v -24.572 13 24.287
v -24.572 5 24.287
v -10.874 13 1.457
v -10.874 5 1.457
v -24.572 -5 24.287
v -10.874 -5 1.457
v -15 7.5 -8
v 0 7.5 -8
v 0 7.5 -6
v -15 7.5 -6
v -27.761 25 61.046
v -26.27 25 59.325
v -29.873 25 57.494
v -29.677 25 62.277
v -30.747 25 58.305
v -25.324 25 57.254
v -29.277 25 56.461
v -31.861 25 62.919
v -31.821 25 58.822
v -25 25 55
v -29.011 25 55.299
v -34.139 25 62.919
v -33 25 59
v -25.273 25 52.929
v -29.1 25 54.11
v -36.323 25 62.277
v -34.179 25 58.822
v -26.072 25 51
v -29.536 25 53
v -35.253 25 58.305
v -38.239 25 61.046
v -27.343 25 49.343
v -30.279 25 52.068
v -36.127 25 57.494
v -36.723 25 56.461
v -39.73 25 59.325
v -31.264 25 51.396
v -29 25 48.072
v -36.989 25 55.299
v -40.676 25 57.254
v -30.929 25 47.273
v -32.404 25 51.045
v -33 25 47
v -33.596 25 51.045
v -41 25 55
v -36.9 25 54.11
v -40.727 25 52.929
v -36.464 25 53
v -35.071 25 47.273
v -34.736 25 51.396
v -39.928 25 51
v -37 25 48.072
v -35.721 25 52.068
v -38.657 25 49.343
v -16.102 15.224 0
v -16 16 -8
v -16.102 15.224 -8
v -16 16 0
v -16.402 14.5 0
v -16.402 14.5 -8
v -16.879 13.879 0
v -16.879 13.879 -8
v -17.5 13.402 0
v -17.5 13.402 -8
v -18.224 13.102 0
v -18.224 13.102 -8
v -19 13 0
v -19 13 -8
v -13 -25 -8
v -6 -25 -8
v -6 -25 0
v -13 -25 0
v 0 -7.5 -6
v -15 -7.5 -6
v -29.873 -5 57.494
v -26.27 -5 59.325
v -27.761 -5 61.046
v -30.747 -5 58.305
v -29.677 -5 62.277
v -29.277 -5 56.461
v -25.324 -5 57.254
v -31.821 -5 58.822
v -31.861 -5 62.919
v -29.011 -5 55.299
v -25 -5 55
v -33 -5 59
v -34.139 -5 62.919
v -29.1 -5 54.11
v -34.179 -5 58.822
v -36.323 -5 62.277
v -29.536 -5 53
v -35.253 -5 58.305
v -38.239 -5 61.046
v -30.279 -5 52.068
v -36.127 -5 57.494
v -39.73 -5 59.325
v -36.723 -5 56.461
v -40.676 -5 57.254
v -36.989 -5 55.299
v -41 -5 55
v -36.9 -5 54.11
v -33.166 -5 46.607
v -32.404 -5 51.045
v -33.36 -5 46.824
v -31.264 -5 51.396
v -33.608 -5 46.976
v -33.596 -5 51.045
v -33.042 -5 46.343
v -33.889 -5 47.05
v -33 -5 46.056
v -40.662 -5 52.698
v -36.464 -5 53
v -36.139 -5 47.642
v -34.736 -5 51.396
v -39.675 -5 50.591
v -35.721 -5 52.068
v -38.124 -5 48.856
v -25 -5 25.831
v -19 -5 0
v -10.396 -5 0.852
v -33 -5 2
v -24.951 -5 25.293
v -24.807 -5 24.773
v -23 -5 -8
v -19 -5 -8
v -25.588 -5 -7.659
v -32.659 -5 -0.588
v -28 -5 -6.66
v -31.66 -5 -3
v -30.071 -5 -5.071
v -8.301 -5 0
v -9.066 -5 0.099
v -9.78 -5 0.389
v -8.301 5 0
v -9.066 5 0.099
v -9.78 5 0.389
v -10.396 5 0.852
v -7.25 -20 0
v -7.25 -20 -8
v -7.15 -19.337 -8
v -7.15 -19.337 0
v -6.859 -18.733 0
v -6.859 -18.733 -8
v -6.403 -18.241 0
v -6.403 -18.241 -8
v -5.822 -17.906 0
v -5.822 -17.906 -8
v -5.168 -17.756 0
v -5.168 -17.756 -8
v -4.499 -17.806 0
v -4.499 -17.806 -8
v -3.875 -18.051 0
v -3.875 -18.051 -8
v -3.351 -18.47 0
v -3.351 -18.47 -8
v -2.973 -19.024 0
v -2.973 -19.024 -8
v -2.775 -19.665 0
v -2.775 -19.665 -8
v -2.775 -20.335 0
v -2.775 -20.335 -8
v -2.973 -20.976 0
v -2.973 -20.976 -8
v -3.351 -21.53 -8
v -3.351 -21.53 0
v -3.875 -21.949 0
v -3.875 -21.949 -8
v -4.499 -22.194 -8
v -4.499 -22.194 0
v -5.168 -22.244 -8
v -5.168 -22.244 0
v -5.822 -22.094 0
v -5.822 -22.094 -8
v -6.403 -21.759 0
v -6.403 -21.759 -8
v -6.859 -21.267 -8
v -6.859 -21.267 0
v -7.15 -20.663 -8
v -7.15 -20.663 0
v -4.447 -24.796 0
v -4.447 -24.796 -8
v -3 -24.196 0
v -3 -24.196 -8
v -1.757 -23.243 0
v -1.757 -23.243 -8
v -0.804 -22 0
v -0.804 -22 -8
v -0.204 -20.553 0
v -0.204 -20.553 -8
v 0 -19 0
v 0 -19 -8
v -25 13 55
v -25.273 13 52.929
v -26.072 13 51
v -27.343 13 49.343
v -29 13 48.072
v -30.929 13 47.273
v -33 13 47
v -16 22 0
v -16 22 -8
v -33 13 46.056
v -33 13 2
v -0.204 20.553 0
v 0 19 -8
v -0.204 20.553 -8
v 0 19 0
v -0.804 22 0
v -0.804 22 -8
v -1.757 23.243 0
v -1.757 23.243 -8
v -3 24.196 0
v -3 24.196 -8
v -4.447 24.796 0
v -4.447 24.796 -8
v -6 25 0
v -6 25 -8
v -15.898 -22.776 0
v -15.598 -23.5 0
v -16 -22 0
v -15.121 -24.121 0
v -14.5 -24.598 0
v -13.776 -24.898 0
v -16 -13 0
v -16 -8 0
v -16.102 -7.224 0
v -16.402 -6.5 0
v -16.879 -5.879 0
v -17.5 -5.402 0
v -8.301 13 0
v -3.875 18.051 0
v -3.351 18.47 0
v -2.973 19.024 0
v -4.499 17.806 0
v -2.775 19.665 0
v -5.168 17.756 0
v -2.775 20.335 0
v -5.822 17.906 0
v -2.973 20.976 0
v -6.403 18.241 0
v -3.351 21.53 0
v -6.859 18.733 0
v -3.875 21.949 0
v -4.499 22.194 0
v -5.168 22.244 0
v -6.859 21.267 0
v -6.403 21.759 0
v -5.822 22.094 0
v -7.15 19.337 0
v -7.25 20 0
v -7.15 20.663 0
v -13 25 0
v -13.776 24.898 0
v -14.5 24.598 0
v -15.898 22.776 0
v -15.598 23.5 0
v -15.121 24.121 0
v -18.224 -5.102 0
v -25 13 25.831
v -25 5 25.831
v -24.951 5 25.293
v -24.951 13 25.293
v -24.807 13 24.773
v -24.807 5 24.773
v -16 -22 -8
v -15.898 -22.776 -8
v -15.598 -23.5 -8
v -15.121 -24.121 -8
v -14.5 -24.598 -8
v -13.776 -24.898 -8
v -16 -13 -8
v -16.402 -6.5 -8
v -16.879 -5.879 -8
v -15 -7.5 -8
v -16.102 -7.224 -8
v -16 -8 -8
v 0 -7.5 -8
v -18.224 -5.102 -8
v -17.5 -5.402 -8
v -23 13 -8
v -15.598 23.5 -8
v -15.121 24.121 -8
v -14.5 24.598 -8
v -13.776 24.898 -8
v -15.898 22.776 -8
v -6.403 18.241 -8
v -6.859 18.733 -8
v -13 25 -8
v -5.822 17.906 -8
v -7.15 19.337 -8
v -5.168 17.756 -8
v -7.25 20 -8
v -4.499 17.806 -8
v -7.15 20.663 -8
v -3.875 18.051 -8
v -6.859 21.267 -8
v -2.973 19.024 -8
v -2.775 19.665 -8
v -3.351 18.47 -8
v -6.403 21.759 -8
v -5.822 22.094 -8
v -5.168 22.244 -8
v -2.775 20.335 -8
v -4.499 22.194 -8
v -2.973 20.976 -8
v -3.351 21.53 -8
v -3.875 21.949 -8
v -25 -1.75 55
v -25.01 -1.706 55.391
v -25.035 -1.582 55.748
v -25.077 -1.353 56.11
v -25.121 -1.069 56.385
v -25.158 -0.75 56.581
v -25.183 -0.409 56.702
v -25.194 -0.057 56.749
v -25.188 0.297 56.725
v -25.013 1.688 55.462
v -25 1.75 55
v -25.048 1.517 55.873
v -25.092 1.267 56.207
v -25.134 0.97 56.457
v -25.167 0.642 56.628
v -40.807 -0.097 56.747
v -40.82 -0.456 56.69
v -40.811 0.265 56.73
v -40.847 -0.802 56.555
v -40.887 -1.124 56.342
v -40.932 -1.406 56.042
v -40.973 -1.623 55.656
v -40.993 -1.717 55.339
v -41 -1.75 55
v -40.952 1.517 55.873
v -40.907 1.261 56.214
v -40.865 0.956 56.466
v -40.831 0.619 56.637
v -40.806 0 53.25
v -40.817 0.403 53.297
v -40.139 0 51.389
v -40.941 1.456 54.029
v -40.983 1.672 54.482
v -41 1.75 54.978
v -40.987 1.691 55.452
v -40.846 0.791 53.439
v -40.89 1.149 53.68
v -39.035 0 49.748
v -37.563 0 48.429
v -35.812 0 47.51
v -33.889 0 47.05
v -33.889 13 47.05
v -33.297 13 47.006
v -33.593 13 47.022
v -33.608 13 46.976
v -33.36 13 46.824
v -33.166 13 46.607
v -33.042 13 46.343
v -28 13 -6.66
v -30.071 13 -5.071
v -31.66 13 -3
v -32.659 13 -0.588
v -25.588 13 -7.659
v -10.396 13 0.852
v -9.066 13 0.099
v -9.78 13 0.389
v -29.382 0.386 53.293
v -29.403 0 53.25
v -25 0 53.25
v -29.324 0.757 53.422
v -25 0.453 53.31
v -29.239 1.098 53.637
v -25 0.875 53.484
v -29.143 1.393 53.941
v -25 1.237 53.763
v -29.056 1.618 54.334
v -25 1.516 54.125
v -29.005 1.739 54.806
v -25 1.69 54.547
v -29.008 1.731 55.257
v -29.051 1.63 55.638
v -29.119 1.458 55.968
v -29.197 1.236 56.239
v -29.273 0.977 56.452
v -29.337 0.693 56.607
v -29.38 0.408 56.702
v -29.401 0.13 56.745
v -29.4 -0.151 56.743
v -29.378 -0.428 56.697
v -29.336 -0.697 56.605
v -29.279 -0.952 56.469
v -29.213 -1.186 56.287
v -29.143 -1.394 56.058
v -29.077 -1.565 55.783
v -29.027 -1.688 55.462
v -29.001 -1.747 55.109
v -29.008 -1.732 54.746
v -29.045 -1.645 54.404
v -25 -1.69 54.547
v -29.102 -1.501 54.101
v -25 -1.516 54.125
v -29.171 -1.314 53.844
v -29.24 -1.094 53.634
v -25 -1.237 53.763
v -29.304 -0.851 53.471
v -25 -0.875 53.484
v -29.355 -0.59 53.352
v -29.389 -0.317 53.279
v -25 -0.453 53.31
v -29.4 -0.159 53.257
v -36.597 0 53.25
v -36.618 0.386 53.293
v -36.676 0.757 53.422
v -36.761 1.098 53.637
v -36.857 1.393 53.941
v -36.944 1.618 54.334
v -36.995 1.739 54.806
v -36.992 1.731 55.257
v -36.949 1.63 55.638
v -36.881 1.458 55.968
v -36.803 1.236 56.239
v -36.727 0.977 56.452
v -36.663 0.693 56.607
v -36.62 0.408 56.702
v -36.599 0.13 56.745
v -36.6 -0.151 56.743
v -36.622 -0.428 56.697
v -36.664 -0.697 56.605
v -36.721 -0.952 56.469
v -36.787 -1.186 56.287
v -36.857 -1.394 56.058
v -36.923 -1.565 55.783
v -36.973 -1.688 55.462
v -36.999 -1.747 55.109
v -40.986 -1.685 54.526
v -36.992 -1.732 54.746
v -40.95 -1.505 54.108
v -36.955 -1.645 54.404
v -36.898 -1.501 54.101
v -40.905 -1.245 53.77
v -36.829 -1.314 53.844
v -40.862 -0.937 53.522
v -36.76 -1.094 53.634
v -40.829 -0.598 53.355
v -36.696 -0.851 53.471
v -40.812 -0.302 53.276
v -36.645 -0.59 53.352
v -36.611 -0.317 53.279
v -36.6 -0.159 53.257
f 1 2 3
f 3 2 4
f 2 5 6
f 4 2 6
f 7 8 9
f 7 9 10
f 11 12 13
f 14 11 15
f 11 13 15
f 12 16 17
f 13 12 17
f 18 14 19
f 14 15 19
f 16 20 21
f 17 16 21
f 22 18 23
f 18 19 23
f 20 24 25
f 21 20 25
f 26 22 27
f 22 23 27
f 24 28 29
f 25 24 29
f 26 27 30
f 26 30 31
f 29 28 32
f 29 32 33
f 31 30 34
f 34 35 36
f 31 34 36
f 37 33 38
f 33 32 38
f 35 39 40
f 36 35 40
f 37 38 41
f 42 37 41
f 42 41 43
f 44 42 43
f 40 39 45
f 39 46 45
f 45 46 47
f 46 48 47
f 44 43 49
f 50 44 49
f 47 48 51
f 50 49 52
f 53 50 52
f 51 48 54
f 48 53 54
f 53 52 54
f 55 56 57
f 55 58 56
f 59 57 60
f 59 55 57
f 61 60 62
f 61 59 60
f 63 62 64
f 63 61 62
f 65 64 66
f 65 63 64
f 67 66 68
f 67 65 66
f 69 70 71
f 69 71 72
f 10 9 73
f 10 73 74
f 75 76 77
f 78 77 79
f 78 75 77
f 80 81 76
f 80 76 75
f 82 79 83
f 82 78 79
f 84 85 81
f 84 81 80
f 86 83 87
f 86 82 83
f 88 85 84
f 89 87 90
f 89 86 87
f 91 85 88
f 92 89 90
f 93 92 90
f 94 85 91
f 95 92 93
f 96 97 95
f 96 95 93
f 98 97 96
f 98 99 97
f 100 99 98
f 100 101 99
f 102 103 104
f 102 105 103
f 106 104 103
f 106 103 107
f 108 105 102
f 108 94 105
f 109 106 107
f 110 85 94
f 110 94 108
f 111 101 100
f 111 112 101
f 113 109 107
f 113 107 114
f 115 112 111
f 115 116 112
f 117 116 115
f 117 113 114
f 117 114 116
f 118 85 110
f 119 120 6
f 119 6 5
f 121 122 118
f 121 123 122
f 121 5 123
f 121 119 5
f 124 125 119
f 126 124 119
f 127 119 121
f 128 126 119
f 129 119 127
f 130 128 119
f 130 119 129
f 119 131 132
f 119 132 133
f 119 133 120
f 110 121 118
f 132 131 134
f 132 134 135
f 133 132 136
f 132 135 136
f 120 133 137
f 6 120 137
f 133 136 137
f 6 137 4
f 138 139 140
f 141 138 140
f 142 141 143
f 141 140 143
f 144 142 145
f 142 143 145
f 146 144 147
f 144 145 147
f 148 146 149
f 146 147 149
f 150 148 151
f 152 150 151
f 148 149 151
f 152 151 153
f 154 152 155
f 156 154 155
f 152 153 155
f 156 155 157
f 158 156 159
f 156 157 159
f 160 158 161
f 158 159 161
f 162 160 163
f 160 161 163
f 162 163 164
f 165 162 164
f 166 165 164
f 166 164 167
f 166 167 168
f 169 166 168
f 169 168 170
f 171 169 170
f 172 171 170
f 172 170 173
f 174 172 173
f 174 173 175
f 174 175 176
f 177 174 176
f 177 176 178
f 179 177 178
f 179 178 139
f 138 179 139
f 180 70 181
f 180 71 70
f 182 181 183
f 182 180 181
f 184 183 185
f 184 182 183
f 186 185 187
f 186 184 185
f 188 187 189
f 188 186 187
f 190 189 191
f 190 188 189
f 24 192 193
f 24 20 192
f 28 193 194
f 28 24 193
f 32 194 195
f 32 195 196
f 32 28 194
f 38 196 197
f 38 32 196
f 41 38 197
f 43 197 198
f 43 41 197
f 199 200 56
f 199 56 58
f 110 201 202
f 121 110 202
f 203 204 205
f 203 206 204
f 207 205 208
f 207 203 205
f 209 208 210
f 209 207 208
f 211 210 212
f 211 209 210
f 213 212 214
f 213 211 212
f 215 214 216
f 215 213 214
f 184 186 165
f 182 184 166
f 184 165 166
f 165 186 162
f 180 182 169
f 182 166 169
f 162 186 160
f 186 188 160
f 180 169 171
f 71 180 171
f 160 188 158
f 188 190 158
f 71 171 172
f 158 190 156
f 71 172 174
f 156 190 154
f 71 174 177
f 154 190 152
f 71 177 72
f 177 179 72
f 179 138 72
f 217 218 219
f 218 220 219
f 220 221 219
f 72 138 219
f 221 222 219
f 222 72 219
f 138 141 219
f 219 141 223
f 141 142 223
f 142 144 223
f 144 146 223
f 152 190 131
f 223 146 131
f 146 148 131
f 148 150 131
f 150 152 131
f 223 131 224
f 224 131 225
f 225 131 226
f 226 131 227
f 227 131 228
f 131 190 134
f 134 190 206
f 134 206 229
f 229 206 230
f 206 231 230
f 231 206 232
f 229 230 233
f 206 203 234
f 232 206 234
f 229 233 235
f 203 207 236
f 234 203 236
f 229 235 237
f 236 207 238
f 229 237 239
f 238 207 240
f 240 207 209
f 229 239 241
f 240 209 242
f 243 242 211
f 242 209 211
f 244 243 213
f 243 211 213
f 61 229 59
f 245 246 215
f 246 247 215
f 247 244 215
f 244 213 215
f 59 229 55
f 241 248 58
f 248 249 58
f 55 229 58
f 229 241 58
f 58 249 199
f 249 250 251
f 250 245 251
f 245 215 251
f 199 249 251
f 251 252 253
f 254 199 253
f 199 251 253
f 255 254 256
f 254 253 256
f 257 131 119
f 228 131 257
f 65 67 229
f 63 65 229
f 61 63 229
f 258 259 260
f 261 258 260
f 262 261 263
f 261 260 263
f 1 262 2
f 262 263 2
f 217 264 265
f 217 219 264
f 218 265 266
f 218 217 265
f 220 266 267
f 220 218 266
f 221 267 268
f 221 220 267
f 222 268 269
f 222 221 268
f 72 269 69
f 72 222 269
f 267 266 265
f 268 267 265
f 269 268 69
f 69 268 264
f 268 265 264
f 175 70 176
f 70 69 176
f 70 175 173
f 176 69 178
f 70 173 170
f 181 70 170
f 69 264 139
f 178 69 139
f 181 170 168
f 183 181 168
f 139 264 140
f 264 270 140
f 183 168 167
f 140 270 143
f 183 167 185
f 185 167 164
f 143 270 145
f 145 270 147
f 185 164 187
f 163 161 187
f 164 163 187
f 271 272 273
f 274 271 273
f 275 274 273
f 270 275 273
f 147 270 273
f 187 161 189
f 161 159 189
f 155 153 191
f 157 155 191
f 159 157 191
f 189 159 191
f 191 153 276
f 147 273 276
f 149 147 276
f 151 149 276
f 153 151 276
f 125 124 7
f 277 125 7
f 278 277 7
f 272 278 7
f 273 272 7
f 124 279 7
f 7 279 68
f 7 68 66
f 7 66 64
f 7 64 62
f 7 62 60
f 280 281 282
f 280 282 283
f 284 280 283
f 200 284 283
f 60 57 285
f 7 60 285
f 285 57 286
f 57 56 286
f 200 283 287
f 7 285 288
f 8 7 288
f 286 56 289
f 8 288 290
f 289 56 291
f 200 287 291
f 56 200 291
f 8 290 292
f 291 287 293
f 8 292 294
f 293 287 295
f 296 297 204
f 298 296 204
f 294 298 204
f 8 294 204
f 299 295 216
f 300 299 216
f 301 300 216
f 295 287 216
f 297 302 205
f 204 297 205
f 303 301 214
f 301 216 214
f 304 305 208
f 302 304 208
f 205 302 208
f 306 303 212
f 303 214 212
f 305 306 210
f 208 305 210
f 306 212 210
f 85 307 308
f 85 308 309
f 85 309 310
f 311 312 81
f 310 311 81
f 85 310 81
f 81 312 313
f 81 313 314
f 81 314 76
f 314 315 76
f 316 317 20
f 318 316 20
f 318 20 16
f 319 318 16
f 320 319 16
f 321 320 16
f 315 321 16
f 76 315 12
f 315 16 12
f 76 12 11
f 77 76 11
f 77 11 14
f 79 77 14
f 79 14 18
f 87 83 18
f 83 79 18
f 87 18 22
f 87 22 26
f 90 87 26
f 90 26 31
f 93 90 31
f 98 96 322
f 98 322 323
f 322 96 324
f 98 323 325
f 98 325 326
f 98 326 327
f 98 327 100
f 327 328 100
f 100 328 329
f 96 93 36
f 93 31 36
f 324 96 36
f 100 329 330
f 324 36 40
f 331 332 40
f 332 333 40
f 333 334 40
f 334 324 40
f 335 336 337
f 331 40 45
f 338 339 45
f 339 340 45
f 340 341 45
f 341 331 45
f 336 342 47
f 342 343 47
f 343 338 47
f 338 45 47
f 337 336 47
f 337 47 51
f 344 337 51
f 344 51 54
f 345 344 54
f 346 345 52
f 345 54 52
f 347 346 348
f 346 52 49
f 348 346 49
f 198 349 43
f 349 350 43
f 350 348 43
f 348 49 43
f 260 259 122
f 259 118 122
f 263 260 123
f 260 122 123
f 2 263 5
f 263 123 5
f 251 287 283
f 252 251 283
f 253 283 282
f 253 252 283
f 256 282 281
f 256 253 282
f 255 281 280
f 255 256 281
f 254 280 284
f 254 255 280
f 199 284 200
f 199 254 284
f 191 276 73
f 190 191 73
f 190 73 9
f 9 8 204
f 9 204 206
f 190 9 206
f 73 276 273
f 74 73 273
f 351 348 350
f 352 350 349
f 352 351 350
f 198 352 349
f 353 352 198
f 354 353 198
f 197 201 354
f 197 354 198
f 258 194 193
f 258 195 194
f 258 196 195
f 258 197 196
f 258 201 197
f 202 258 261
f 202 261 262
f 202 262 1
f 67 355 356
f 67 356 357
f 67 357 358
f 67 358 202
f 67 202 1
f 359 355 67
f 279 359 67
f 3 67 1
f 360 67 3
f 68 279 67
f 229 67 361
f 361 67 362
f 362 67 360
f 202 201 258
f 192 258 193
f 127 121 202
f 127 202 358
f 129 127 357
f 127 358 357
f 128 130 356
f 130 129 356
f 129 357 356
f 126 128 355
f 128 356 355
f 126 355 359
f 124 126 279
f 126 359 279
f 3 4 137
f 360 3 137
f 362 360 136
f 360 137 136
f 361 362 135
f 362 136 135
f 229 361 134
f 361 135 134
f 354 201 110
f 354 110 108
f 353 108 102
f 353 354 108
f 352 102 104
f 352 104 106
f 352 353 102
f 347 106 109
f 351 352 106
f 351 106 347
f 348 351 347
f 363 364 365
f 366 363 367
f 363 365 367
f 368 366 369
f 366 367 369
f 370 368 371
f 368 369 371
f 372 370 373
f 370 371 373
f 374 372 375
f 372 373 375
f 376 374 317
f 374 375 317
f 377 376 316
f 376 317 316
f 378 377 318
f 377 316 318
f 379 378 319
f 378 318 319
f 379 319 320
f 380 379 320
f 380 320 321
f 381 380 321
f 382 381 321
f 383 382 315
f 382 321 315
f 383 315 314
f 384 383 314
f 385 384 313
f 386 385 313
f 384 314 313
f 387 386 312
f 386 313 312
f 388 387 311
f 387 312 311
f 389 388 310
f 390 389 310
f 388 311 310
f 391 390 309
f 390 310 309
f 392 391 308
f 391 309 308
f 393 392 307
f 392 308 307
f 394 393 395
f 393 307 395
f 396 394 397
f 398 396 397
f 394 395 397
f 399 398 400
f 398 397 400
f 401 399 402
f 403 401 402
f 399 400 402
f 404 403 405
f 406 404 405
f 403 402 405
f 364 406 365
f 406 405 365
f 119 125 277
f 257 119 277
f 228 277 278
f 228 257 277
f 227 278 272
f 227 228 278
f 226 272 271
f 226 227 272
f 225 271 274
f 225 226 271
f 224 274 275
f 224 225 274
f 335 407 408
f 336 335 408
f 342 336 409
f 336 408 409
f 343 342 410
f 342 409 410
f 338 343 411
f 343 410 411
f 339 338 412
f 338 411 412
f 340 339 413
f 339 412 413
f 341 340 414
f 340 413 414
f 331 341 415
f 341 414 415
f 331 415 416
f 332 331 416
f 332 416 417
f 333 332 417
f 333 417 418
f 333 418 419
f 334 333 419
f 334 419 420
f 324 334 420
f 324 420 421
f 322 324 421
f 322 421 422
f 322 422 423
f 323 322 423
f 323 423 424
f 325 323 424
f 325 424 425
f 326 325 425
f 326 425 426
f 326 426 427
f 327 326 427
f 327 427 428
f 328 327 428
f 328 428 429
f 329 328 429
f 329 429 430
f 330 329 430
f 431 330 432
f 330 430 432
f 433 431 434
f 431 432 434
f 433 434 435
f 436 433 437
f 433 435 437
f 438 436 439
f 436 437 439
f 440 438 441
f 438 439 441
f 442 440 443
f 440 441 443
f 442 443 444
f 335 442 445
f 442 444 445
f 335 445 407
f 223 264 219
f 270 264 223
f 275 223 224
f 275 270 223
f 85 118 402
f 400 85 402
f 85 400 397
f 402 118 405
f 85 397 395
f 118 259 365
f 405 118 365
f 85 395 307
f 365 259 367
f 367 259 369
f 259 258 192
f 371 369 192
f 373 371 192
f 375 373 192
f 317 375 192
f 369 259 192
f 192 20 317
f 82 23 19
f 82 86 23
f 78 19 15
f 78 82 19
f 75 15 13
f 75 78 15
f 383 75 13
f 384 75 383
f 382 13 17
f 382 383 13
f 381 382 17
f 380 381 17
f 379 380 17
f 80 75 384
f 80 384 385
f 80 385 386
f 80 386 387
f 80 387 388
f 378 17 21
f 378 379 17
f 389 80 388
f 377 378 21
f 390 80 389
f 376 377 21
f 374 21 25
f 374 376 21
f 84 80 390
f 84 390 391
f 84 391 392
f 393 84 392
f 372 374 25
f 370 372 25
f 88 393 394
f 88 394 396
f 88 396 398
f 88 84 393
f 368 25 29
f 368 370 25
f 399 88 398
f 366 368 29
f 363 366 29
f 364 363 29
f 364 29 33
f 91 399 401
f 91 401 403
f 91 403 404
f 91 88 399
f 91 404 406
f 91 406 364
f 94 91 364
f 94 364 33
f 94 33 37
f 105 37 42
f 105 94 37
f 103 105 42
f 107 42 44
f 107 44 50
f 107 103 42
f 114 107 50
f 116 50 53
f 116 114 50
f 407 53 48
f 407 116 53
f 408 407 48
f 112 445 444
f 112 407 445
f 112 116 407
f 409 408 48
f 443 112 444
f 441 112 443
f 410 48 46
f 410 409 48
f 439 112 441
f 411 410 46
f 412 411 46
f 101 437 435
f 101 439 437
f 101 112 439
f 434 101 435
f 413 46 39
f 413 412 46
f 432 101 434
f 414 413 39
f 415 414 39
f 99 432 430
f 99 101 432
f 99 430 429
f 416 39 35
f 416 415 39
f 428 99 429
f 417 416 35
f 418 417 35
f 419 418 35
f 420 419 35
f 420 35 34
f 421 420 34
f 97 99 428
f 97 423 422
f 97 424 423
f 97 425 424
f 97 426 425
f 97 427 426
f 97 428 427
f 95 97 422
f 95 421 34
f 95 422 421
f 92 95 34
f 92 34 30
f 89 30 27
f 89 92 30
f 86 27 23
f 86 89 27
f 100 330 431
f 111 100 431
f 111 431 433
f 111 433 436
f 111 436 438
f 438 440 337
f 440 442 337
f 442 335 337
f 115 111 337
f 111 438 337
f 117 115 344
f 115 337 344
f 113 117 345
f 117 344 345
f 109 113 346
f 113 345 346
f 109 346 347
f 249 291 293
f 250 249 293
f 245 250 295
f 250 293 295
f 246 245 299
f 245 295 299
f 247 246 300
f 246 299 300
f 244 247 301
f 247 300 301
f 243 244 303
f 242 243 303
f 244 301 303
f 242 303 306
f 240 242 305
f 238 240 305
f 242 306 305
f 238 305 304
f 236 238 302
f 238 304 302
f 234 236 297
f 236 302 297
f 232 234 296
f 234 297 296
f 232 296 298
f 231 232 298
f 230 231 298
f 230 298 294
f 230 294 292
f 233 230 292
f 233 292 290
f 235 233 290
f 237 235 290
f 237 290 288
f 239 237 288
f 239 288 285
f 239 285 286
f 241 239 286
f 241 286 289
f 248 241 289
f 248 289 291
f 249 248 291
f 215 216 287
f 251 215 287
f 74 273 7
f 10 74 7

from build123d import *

# Parameters (mm, degrees)
SKETCH_6_R               = 4
EXTRUDE_3_DEPTH          = 25
FILLET_1_R               = 10
FILLET_2_R               = 3
SKETCH_7_R               = 2.25
CUT_EXTRUDE_4_DEPTH      = 50
SKETCH_8_R               = 1.75
CUT_EXTRUDE_5_DEPTH      = 50
EXTRUDE_4_DEPTH          = 5
FILLET_5_R               = 3
FILLET_6_R               = 6
SKETCH_11_W              = 55
SKETCH_11_H              = 12
CUT_EXTRUDE_7_DEPTH      = 17
CUT_EXTRUDE_8_DEPTH      = 80.214897752
CUT_EXTRUDE_8_DEPTH_BACK = 80.214897752
SKETCH_12_W              = 30.277816987
SKETCH_12_H              = 21.642627305
FILLET_7_R               = 8
FILLET_8_R               = 3
FILLET_9_R               = 1
FILLET_10_R              = 3
EXTRUDE_5_DEPTH          = 8
SKETCH_14_W              = 30
SKETCH_14_H              = 15
CUT_EXTRUDE_9_DEPTH      = 2


with BuildPart() as part:
    # 草图6 → 凸台-拉伸3 (new, symmetric)
    with BuildSketch(Plane(origin=(0, 0, 0), x_dir=(1, 0, 0), z_dir=(0, 1, 0))):
        with BuildLine():
            Line((0, 0), (-25, 0))
            Line((-25, 0), (-25, -55))
            ThreePointArc((-25, -55), (-33, -63), (-41, -55))
            ThreePointArc((-41, -55), (-38.656854249, -49.343145751), (-33, -47))
            Line((-33, -47), (-33, 8))
            Line((-33, 8), (0, 8))
            Line((0, 8), (0, 0))
        make_face()
        with Locations(Location((-33, -55, 0), (0, 0, 270))):
            Circle(SKETCH_6_R, mode=Mode.SUBTRACT)
    extrude(amount=EXTRUDE_3_DEPTH, both=True)

    # 圆角1
    fillet_1_edges = [part.edges().sort_by_distance(p)[0] for p in [
        (-33, 0, -8),
    ]]
    fillet(fillet_1_edges, radius=FILLET_1_R)

    # 圆角2
    fillet_2_edges = [part.edges().sort_by_distance(p)[0] for p in [
        (-25, 0, 0),
    ]]
    fillet(fillet_2_edges, radius=FILLET_2_R)

    # 草图7 → 切除-拉伸4 (cut)
    with BuildSketch(Plane(origin=(0, 0, -8), x_dir=(-1, 0, 0), z_dir=(0, 0, -1))):
        with Locations((5, 20)):
            Circle(SKETCH_7_R)
        with Locations((5, -20)):
            Circle(SKETCH_7_R)
    extrude(amount=-CUT_EXTRUDE_4_DEPTH, mode=Mode.SUBTRACT)

    # 草图8 → 切除-拉伸5 (cut)
    with BuildSketch(Plane(origin=(-25, 0, 0), x_dir=(0, 0, -1), z_dir=(1, 0, 0))):
        with Locations((-55, 0)):
            Circle(SKETCH_8_R)
    extrude(amount=-CUT_EXTRUDE_5_DEPTH, mode=Mode.SUBTRACT)

    # 草图9 → 凸台-拉伸4 (add, symmetric)
    with BuildSketch(Plane(origin=(0, 0, 0), x_dir=(1, 0, 0), z_dir=(0, 1, 0))):
        with BuildLine():
            Line((-10, 0), (-25, -25))
            Line((-25, -25), (-25, -3))
            ThreePointArc((-25, -3), (-24.121320344, -0.878679656), (-22, 0))
            Line((-22, 0), (-10, 0))
        make_face()
    extrude(amount=EXTRUDE_4_DEPTH, both=True)

    # 圆角5
    fillet_5_edges = [part.edges().sort_by_distance(p)[0] for p in [
        (-10, 0, 0),
        (-25, 0, 25),
    ]]
    fillet(fillet_5_edges, radius=FILLET_5_R)

    # 圆角6
    fillet_6_edges = [part.edges().sort_by_distance(p)[0] for p in [
        (0, 25, -4),
        (0, -25, -4),
    ]]
    fillet(fillet_6_edges, radius=FILLET_6_R)

    # 草图11 → 切除-拉伸7 (cut)
    with BuildSketch(Plane.ZY.offset(33)):
        with Locations((19.5, 19)):
            Rectangle(SKETCH_11_W, SKETCH_11_H)
        with Locations((19.5, -19)):
            Rectangle(SKETCH_11_W, SKETCH_11_H)
    extrude(amount=-CUT_EXTRUDE_7_DEPTH, mode=Mode.SUBTRACT)

    # 草图12 → 切除-拉伸8 (cut, two sides: drawn at the far end of the back side and taken through both)
    with BuildSketch(Plane.XY.offset(-CUT_EXTRUDE_8_DEPTH_BACK)):
        with Locations((-31.138908494, -15.821313653)):
            Rectangle(SKETCH_12_W, SKETCH_12_H)
    extrude(amount=CUT_EXTRUDE_8_DEPTH + CUT_EXTRUDE_8_DEPTH_BACK, mode=Mode.SUBTRACT)

    # 圆角7
    fillet_7_edges = [part.edges().sort_by_distance(p)[0] for p in [
        (-25, 19, 47),
    ]]
    fillet(fillet_7_edges, radius=FILLET_7_R - 0.0001)  # a hair under: the kernel refuses the full size

    # 圆角8
    fillet_8_edges = [part.edges().sort_by_distance(p)[0] for p in [
        (-16, 13, -4),
        (-16, 25, -4),
    ]]
    fillet(fillet_8_edges, radius=FILLET_8_R)

    # 圆角9
    fillet_9_edges = [part.edges().sort_by_distance(p)[0] for p in [
        (-33, 6.5, 47),
    ]]
    fillet(fillet_9_edges, radius=FILLET_9_R)

    # 圆角10
    fillet_10_edges = [part.edges().sort_by_distance(p)[0] for p in [
        (-16, -25, -4),
        (-16, -5, -4),
    ]]
    fillet(fillet_10_edges, radius=FILLET_10_R)

    # 草图13 → 凸台-拉伸5 (add)
    with BuildSketch(Plane(origin=(0, 5, 0), x_dir=(1, 0, 0), z_dir=(0, 1, 0))):
        with BuildLine():
            Line((-8.301428863, 0), (-22, 0))
            ThreePointArc((-22, 0), (-24.121320344, -0.878679656), (-25, -3))
            Line((-25, -3), (-25, -25.830951895))
            ThreePointArc((-25, -25.830951895), (-24.891144785, -25.030151149), (-24.572478777, -24.287464629))
            Line((-24.572478777, -24.287464629), (-10.87390764, -1.456512734))
            ThreePointArc((-10.87390764, -1.456512734), (-9.779525308, -0.38940028), (-8.301428863, 0))
        make_face()
    extrude(amount=EXTRUDE_5_DEPTH)

    # 草图14 → 切除-拉伸9 (cut)
    with BuildSketch(Plane(origin=(0, 0, -8), x_dir=(-1, 0, 0), z_dir=(0, 0, -1))):
        Rectangle(SKETCH_14_W, SKETCH_14_H)
    extrude(amount=-CUT_EXTRUDE_9_DEPTH, mode=Mode.SUBTRACT)


solid = part.part
